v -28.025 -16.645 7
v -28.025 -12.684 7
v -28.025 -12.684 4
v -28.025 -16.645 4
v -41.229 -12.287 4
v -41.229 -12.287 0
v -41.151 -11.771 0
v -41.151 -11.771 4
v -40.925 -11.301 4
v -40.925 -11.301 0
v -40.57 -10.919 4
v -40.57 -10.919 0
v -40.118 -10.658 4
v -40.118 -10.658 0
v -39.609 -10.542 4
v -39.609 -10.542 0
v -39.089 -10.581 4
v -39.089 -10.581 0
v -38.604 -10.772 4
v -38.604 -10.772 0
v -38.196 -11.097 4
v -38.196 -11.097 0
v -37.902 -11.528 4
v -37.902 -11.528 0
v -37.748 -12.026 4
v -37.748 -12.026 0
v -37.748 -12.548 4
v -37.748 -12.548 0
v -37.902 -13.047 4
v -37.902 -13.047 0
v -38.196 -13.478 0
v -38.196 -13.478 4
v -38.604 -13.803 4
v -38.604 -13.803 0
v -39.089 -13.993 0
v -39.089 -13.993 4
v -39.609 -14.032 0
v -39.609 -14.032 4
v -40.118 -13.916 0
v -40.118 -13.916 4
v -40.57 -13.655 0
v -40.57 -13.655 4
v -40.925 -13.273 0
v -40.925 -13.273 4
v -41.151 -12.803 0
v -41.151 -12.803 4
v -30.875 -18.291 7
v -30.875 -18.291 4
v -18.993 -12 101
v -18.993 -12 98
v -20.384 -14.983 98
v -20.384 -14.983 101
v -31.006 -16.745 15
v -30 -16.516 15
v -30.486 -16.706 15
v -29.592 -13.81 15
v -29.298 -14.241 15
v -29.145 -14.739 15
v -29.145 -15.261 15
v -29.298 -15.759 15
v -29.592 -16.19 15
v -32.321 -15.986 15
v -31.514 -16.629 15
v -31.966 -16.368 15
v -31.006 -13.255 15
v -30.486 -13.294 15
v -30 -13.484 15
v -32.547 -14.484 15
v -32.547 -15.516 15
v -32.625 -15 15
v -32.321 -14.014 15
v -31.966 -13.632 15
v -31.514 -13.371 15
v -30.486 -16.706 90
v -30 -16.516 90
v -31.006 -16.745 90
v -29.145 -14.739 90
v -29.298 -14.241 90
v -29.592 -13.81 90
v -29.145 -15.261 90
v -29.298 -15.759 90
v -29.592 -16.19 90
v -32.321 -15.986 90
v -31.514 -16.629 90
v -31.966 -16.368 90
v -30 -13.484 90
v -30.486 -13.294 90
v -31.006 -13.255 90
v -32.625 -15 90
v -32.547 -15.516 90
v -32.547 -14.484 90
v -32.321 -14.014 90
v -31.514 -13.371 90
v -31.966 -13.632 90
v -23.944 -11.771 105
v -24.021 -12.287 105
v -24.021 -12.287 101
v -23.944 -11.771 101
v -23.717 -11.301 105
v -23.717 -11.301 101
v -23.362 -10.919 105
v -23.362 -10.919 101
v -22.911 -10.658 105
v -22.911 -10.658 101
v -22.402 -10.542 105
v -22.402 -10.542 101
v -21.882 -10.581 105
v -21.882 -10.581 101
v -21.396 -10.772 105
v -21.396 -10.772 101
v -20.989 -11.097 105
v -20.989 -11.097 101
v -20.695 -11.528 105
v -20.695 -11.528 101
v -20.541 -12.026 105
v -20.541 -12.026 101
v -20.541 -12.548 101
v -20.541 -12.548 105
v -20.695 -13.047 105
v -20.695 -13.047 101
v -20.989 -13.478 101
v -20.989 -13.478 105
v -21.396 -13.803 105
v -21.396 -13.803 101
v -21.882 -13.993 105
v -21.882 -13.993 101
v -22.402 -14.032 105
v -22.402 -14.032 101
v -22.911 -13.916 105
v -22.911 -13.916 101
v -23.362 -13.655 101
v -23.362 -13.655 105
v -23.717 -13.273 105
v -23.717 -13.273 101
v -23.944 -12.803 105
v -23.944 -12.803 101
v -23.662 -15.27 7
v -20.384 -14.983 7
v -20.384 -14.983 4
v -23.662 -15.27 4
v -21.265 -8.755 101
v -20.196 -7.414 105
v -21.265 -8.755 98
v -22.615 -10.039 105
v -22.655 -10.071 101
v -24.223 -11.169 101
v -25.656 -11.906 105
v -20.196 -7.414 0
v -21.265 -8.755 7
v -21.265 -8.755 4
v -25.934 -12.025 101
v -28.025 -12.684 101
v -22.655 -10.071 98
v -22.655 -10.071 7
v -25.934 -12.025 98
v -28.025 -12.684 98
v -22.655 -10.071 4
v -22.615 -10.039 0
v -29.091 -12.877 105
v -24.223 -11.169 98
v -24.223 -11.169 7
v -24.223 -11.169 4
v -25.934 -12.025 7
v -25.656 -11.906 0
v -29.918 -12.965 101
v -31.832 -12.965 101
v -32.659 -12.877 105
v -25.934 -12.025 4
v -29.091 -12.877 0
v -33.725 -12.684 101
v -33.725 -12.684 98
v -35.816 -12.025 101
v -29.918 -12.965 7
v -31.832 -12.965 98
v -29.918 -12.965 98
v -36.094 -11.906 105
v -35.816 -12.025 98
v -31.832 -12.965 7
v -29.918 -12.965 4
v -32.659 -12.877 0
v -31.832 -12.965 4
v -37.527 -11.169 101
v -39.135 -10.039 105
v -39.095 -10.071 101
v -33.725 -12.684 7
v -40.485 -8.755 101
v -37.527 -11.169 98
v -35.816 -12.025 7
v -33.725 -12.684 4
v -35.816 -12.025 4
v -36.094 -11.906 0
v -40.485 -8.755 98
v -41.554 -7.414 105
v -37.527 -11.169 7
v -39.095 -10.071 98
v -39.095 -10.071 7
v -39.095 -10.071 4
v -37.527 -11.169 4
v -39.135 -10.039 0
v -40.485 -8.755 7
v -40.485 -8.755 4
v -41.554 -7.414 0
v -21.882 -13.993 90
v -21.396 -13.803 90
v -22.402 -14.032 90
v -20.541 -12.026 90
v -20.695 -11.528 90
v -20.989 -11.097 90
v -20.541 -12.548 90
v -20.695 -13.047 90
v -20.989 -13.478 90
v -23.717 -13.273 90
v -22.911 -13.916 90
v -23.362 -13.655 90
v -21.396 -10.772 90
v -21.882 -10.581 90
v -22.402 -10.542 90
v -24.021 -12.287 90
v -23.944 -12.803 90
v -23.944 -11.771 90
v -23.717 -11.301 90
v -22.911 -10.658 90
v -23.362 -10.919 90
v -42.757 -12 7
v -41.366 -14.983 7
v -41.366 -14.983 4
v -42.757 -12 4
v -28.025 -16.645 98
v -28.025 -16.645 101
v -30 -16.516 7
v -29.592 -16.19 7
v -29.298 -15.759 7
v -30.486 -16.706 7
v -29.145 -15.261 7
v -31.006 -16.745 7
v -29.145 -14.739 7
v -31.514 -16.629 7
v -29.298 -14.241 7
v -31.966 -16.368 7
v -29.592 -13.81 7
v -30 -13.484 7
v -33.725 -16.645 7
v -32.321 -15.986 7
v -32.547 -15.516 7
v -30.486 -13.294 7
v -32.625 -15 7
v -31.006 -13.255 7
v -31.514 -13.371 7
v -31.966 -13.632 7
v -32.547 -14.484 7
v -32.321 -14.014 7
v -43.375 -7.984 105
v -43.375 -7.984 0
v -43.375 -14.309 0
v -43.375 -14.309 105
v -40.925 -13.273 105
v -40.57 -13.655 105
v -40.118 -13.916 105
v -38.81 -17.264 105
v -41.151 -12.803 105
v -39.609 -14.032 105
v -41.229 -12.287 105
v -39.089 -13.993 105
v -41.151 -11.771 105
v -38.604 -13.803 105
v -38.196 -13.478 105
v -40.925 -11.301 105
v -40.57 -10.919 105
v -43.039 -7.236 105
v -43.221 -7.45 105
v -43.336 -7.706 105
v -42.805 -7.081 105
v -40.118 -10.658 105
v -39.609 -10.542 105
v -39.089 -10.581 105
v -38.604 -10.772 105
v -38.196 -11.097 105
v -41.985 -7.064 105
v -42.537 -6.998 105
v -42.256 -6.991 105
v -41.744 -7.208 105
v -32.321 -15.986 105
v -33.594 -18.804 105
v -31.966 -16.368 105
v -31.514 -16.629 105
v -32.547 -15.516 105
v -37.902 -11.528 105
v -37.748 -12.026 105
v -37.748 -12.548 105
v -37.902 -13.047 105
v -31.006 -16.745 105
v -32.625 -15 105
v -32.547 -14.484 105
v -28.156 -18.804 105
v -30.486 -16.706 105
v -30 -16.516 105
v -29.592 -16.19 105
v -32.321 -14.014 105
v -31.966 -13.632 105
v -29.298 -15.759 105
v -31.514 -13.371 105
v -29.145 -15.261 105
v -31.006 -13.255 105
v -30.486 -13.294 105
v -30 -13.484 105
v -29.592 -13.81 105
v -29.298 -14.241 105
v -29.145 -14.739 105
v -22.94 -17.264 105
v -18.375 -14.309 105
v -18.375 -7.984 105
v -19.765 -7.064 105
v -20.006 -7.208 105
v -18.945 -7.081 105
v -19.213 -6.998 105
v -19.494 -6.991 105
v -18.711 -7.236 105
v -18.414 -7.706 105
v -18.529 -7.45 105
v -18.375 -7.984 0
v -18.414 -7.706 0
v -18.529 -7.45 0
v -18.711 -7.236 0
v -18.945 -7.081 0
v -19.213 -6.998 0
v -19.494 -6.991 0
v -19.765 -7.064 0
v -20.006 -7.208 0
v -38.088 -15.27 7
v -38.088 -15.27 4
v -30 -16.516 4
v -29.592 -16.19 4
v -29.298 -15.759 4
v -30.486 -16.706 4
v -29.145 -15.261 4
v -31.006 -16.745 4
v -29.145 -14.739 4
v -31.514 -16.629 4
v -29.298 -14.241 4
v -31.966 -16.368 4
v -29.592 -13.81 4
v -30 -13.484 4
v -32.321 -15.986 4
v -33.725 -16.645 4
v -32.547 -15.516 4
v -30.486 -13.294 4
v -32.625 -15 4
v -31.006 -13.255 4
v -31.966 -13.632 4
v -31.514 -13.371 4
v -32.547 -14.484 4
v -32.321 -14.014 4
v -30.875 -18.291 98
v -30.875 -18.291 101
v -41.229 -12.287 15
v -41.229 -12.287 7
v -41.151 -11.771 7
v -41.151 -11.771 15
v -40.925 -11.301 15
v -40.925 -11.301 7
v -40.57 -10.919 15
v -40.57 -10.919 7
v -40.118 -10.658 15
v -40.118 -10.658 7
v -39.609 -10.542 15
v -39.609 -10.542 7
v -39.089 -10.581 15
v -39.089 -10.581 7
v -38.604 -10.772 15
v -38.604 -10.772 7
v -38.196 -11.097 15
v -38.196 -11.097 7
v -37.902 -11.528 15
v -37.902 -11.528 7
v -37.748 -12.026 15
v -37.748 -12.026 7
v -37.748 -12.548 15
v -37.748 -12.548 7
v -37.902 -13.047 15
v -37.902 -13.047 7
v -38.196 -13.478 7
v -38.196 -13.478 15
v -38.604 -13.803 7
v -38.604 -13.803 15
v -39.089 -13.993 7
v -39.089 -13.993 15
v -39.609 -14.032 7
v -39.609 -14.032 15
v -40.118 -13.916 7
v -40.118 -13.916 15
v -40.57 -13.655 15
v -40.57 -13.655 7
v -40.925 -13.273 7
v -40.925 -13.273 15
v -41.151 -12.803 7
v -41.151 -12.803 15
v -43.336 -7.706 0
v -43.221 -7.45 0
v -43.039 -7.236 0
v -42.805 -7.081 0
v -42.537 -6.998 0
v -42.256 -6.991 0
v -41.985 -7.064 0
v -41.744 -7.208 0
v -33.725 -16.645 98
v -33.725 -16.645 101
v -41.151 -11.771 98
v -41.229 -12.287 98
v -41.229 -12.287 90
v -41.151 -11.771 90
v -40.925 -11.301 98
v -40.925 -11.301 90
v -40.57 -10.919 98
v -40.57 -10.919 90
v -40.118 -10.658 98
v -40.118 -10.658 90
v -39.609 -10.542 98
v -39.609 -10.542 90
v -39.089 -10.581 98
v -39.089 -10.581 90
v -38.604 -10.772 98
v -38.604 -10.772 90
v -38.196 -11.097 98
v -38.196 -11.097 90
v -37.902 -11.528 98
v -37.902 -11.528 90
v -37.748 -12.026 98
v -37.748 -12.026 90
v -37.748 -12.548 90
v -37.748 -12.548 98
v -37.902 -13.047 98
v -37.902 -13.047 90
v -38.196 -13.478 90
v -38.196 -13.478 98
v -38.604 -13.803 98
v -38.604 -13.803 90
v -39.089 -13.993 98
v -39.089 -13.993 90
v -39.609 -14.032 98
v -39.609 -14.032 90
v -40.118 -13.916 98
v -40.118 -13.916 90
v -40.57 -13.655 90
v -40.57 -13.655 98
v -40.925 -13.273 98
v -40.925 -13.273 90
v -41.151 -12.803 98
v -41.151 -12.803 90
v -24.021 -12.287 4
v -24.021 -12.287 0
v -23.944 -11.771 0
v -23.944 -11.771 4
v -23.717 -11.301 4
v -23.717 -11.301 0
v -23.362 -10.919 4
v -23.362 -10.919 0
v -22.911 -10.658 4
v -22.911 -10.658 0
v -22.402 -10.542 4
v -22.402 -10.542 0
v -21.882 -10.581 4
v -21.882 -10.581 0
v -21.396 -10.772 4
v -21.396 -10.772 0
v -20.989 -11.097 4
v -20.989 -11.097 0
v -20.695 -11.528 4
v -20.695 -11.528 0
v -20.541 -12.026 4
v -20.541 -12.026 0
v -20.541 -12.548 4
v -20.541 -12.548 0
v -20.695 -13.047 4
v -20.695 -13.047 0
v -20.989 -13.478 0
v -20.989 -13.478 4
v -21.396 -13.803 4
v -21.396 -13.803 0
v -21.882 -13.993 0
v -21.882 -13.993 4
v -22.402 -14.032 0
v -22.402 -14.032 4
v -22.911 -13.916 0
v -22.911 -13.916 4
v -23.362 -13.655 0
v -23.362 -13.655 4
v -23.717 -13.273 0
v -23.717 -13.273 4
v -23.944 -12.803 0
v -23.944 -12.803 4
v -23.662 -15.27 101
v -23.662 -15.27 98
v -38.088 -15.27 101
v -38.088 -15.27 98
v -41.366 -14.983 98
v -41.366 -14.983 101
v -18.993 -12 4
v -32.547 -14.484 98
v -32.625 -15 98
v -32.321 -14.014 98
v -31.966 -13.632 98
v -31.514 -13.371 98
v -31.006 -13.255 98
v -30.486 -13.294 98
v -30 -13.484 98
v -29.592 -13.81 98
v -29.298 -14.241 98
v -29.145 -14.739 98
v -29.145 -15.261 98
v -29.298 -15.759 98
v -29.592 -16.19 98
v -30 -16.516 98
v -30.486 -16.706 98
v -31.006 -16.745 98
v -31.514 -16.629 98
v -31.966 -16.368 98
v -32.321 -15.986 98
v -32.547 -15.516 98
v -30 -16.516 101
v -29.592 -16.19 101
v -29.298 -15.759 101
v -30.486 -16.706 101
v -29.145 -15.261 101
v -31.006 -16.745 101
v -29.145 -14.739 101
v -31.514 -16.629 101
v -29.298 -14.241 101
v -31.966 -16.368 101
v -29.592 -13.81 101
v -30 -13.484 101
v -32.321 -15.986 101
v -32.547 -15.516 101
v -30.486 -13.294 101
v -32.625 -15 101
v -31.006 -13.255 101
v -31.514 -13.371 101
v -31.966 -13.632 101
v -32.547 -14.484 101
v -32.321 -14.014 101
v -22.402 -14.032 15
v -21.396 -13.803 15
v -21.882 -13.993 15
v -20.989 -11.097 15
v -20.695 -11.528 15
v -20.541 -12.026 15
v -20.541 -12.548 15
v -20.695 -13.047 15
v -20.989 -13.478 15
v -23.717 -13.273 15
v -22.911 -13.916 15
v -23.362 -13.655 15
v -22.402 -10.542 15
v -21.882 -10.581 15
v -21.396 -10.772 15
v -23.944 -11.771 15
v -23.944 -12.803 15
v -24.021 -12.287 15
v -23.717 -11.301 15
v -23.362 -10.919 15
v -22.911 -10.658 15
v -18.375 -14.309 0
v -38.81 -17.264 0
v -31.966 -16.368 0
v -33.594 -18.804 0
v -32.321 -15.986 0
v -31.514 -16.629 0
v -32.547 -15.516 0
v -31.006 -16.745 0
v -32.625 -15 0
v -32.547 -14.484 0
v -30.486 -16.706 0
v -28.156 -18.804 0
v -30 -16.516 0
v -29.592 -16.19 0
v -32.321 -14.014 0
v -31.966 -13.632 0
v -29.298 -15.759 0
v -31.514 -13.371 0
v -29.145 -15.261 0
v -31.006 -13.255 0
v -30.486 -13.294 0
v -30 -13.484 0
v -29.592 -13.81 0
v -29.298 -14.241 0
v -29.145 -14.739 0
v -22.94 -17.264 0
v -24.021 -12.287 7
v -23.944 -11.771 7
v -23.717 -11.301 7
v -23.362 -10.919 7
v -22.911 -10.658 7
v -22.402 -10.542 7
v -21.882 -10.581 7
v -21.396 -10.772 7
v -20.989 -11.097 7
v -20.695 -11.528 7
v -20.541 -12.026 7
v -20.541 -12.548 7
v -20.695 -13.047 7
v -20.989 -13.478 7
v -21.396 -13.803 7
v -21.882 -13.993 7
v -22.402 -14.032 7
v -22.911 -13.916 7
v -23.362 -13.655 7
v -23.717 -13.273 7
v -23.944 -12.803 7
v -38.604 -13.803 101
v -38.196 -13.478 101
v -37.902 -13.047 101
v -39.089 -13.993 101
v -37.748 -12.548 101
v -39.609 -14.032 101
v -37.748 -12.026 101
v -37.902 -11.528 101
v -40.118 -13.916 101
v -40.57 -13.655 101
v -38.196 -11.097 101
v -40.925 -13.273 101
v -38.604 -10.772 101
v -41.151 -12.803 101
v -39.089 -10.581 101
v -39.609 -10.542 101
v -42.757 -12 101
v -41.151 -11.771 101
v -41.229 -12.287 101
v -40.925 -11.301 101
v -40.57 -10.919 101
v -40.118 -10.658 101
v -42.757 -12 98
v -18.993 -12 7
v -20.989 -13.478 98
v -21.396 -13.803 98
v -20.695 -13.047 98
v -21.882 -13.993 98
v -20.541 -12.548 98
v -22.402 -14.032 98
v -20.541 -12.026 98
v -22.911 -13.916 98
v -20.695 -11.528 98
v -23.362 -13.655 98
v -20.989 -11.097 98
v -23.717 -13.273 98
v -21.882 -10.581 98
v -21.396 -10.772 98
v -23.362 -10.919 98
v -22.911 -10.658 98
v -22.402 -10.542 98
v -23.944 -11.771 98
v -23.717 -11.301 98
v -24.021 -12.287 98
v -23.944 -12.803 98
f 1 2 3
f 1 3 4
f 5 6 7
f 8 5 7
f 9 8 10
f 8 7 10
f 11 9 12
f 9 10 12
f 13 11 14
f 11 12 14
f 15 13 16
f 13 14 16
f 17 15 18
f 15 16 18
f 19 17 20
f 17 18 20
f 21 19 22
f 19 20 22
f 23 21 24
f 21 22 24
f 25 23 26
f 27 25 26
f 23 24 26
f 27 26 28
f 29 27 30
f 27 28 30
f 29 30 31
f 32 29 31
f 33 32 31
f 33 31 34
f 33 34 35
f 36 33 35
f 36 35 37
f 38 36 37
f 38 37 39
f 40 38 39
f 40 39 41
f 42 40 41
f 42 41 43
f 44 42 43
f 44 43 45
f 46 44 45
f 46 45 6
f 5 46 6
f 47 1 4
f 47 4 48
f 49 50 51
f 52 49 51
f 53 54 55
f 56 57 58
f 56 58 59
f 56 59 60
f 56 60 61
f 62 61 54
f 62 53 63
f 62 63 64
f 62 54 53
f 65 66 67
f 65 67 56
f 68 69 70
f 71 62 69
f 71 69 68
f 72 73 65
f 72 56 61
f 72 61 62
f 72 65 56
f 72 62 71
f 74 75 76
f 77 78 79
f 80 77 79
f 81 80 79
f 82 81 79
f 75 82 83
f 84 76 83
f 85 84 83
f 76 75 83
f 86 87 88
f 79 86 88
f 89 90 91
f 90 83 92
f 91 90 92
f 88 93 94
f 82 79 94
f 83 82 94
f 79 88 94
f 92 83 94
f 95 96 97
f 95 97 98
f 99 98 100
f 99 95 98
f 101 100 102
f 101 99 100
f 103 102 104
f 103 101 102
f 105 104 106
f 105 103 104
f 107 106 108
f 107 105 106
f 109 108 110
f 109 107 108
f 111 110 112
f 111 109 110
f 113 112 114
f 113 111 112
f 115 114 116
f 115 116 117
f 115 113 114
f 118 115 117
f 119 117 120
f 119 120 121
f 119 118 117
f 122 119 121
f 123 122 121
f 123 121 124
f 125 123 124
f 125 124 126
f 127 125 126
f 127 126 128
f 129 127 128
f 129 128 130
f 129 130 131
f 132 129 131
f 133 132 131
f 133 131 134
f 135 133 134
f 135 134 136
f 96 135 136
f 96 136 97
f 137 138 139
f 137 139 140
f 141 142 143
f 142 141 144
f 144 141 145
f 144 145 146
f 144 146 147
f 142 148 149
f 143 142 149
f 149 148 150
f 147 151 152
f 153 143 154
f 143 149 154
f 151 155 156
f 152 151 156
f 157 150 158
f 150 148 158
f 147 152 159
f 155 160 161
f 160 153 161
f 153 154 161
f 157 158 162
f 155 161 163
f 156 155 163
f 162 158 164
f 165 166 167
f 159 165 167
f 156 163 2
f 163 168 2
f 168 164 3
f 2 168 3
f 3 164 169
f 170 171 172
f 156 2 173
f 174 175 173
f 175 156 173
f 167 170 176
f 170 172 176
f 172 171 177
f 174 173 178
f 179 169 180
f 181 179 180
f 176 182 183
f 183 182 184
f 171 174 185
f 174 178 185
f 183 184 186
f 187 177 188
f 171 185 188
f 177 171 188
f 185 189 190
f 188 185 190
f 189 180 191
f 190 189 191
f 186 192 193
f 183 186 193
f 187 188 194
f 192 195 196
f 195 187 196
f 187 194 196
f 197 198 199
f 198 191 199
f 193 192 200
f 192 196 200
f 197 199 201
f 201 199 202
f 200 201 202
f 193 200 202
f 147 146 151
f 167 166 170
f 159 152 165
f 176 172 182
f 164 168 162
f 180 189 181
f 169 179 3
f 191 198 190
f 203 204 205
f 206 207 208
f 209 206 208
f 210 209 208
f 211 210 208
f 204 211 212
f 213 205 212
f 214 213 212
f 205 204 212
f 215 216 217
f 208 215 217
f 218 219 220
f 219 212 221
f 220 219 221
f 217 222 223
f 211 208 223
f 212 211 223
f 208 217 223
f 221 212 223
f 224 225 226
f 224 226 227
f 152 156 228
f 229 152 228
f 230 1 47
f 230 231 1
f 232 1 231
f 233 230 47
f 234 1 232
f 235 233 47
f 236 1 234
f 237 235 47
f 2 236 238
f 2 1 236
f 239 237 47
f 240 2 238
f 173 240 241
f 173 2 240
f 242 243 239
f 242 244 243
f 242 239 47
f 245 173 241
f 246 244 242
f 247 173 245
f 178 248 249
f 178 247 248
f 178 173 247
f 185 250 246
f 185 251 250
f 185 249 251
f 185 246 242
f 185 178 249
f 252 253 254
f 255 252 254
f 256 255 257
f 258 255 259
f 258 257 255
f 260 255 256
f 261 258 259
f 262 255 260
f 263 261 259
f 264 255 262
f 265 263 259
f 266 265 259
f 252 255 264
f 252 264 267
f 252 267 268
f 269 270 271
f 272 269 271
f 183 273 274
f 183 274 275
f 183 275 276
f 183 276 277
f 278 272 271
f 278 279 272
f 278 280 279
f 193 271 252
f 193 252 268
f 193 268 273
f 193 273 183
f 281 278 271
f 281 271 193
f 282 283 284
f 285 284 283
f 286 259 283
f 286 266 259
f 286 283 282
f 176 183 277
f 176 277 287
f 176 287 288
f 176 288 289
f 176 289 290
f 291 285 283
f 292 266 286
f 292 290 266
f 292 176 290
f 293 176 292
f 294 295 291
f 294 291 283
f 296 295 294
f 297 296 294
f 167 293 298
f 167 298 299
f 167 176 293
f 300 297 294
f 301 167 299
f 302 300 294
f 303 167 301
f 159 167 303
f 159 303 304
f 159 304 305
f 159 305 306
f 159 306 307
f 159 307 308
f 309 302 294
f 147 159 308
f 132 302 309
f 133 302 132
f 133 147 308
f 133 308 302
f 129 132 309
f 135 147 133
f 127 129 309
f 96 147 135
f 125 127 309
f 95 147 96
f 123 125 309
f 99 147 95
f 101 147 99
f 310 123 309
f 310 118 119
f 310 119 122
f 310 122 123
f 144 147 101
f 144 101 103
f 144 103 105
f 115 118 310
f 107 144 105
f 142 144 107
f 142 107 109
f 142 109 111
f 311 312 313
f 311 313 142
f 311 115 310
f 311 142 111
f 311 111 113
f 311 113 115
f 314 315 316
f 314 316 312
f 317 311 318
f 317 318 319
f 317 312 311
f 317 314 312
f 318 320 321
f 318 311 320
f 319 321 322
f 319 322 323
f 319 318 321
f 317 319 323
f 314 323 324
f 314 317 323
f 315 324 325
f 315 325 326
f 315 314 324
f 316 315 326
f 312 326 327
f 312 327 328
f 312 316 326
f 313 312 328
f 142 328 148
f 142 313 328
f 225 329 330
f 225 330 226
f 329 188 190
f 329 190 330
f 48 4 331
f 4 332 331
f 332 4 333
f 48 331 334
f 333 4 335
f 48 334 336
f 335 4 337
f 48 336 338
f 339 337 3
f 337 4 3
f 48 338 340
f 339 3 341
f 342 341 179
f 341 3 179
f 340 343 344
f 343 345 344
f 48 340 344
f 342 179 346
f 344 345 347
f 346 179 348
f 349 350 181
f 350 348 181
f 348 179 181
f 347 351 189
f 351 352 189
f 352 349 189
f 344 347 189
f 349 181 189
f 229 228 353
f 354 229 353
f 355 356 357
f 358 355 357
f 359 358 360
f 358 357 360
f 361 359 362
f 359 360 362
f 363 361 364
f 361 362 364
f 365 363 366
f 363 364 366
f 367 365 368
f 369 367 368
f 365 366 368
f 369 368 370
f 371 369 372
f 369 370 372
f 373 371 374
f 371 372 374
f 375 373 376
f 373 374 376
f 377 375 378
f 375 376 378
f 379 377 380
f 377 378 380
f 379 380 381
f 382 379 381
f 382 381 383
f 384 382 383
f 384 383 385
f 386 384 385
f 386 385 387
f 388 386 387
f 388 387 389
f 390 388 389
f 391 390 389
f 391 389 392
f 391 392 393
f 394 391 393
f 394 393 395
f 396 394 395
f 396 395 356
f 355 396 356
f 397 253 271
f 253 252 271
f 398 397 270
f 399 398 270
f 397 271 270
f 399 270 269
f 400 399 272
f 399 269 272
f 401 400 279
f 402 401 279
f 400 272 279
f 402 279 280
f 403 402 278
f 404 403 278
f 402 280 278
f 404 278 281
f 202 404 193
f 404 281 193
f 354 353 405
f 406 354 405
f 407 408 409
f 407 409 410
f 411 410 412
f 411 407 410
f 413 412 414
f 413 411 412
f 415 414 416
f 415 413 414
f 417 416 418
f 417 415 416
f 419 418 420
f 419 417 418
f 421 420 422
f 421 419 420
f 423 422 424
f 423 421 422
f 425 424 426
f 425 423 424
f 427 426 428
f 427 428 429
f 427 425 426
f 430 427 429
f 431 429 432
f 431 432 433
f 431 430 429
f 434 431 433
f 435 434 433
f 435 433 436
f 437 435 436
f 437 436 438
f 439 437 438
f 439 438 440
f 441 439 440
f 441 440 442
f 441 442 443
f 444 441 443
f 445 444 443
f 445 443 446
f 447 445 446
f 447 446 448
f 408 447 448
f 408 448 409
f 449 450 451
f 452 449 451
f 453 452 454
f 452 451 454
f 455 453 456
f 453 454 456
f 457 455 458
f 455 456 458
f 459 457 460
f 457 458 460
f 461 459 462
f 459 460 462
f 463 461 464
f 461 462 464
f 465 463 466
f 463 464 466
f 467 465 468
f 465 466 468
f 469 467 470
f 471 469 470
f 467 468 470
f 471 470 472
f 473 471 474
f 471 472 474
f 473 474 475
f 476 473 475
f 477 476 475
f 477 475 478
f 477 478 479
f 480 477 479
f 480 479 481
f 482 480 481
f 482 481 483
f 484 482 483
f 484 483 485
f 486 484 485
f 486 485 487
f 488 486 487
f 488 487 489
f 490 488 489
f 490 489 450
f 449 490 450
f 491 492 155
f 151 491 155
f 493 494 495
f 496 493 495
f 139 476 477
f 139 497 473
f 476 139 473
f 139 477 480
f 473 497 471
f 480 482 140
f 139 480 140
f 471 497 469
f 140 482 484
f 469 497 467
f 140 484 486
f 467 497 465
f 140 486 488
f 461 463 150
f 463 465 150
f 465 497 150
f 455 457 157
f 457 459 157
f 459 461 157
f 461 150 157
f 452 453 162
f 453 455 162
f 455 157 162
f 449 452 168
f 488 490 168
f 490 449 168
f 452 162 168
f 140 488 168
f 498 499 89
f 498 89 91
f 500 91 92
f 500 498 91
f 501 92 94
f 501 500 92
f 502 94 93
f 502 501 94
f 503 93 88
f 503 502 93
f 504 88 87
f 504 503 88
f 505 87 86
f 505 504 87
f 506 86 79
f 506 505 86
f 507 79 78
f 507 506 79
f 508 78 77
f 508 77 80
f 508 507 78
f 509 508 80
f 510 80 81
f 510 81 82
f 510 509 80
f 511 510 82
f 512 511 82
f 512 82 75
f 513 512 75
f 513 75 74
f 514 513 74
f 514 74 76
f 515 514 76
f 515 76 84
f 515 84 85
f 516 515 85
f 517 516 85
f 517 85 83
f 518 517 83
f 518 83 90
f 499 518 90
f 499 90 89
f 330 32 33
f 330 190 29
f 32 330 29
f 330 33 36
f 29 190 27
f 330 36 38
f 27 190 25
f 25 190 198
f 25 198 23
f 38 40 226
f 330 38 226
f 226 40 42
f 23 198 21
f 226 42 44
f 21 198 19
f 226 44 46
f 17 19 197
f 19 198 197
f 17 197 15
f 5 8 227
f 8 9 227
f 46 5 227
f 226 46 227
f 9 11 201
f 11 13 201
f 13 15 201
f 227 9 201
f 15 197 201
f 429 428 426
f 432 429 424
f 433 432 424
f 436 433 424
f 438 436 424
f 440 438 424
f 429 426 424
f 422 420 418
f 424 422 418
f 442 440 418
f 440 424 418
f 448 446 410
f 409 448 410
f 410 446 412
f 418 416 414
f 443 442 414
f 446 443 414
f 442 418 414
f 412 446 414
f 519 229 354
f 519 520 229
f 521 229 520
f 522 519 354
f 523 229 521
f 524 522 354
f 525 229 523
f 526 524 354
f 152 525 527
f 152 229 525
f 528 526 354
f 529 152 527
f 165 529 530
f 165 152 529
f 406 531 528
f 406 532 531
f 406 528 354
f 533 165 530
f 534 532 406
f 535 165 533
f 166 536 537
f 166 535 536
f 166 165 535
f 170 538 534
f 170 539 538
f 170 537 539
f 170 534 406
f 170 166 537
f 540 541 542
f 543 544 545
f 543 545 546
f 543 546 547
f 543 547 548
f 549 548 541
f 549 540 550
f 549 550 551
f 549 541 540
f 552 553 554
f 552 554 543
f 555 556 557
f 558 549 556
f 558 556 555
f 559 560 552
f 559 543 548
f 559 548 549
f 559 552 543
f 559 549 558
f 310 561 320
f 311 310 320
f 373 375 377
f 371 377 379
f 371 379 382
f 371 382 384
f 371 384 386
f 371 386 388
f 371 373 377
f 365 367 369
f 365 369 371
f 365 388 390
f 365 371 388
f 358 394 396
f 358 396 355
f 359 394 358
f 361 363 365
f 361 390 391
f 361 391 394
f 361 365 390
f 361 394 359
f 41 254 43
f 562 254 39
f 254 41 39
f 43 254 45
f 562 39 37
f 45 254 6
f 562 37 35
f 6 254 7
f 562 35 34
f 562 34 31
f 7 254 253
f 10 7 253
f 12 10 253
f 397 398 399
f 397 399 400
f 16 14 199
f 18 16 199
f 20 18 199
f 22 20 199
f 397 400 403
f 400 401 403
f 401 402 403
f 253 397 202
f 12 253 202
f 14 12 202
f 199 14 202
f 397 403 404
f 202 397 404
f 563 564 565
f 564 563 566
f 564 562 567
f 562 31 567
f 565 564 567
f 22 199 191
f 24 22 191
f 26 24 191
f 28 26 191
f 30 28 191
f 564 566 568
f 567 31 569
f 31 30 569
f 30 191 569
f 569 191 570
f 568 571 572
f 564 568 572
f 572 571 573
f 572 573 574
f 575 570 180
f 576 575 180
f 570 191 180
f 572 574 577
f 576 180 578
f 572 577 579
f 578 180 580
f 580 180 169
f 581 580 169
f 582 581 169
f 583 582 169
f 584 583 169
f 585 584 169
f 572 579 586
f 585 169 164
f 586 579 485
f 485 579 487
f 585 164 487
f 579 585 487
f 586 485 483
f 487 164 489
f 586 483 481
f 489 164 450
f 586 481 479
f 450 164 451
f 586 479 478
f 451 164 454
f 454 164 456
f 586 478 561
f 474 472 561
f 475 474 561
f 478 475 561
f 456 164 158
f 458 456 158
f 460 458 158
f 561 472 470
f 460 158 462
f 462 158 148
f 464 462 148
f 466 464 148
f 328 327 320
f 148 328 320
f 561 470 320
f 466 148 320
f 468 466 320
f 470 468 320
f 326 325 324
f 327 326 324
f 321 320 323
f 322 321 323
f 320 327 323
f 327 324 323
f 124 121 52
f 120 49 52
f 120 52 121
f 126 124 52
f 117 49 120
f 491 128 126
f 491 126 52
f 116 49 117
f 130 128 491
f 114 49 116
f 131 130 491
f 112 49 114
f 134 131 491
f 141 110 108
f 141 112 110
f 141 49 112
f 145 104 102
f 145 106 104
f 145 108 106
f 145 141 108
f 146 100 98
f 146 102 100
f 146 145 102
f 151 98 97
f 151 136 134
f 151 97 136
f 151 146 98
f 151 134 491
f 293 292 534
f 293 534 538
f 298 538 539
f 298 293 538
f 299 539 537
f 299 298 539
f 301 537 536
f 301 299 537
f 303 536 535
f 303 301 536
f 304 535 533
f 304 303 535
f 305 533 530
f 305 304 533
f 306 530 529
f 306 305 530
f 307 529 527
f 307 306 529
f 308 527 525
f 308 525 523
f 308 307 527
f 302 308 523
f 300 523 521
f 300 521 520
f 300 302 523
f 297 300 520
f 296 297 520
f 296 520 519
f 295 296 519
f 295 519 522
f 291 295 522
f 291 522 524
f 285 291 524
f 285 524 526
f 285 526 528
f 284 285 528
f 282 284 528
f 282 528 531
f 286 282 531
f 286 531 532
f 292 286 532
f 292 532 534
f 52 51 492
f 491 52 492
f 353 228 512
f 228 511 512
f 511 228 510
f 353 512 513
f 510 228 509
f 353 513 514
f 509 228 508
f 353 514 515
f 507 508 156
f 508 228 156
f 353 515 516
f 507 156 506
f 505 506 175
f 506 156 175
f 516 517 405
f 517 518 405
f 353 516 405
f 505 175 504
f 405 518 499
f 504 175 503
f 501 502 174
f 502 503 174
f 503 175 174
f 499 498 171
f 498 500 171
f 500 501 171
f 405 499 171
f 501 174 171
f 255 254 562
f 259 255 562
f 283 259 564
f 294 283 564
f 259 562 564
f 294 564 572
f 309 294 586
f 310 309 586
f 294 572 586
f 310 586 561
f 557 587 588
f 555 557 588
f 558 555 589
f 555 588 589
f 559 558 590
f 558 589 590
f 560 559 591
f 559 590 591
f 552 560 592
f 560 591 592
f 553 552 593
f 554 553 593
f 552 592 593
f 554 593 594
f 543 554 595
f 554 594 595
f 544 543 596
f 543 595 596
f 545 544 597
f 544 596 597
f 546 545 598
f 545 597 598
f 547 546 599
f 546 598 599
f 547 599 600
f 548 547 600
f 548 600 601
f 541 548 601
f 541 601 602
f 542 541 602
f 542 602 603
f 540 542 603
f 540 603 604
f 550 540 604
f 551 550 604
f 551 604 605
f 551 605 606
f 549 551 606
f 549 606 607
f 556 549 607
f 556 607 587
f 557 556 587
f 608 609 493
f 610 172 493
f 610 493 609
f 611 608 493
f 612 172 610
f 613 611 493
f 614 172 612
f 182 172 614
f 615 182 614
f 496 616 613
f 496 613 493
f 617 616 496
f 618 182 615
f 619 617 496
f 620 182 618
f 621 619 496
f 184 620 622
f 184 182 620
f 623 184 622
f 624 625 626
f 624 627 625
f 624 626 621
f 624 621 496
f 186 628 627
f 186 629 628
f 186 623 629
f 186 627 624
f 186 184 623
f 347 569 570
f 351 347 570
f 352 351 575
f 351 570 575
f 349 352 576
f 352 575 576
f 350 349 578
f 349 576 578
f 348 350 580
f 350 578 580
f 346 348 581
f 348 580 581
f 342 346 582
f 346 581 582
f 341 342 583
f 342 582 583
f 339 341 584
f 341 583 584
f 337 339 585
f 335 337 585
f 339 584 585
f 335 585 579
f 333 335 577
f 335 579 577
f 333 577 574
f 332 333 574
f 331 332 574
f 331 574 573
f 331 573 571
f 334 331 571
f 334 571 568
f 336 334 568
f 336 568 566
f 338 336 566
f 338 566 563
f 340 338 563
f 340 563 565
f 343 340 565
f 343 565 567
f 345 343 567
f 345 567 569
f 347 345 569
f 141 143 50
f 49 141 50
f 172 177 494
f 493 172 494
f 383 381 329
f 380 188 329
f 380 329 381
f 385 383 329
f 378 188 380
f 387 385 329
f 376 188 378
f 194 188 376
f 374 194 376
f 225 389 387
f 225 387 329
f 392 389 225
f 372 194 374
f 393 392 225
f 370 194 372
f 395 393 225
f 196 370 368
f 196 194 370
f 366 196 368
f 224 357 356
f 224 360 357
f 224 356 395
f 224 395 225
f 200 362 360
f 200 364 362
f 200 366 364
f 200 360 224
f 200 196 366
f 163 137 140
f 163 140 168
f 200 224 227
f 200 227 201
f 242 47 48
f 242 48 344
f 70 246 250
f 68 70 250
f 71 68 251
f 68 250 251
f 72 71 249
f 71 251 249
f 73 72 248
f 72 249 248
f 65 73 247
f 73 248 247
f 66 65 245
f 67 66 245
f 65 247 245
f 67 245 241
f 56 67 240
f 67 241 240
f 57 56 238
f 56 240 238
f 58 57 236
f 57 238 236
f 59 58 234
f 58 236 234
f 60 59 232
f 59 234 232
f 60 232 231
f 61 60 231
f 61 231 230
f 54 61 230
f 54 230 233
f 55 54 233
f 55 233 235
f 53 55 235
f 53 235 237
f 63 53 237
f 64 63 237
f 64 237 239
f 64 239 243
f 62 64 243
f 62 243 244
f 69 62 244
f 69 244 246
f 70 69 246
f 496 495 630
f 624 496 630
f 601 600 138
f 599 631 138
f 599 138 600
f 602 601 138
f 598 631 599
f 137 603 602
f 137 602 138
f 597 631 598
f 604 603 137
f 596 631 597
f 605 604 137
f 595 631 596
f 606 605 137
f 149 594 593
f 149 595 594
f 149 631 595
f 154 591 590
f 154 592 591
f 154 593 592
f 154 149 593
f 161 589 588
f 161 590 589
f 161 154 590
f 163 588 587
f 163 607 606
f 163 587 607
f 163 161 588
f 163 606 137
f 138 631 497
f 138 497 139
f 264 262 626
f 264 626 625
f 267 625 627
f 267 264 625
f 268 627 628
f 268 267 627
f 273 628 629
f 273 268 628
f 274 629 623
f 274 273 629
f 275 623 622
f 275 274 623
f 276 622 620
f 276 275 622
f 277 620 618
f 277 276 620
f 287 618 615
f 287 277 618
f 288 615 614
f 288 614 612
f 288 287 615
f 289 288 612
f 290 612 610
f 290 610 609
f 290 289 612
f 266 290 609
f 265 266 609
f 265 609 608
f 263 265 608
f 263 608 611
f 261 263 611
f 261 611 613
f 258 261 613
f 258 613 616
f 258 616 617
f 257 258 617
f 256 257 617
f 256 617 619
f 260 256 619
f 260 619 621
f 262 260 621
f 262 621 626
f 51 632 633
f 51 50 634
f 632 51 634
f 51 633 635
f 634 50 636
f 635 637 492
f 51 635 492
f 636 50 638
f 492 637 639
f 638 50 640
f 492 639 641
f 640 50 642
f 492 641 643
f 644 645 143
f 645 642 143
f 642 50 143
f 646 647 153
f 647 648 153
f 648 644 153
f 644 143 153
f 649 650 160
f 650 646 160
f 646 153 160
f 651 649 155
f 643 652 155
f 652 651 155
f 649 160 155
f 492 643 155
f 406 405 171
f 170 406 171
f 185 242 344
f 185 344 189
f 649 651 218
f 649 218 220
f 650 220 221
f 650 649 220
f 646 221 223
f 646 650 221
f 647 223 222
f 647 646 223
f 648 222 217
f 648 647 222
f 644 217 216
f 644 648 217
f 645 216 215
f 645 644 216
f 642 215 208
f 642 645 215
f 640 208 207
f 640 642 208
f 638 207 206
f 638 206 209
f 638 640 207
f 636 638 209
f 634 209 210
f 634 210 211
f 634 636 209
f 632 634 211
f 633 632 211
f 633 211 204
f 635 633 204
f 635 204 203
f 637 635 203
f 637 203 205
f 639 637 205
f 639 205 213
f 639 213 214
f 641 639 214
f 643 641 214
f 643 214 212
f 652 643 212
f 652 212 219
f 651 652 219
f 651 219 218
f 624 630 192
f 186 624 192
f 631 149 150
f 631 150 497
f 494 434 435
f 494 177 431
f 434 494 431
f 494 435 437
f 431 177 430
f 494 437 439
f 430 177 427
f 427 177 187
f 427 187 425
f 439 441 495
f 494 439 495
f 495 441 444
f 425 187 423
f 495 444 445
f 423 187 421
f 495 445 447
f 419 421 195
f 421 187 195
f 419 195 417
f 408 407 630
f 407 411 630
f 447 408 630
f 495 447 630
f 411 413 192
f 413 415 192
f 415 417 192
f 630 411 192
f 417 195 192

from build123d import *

# Parameters (mm, degrees)
BOSS_EXTRUDE1_DEPTH    = 105
SKETCH3_R              = 1.75
CUT_EXTRUDE1_DEPTH     = 15
CUT_EXTRUDE2_START     = -3
CUT_EXTRUDE2_OUTLINE_R = 1.75
CUT_EXTRUDE2_DEPTH     = 3
FILLET1_R              = 1


# Read off the part's stored shape, not the designer's step: Cut-Extrude2
with BuildPart() as part:
    # Sketch1 → Boss-Extrude1 (new body)
    with BuildSketch(Plane.XY):
        with BuildLine():
            ThreePointArc((-43.375, -14.309088021), (-30.875, -19), (-18.375, -14.309088021))
            Line((-18.375, -14.309088021), (-18.375, -3.570714214))
            ThreePointArc((-18.375, -3.570714214), (-30.875, -13), (-43.375, -3.570714214))
            Line((-43.375, -3.570714214), (-43.375, -14.309088021))
        make_face()
    extrude(amount=BOSS_EXTRUDE1_DEPTH)

    # Sketch3 → Cut-Extrude1 (cut)
    with BuildSketch(Plane(origin=(0, 0, 0), x_dir=(-1, 0, 0), z_dir=(0, 0, -1))):
        with Locations((22.271353455, -12.287280664)):
            Circle(SKETCH3_R)
        with Locations((30.875, -15)):
            Circle(SKETCH3_R)
        with Locations((39.478646545, -12.287280664)):
            Circle(SKETCH3_R)
    cut_extrude1 = extrude(amount=-CUT_EXTRUDE1_DEPTH, mode=Mode.SUBTRACT)

    # Cut-Extrude2 outline → Cut-Extrude2 (cut)
    # profile 1 of 3: a face of its own
    with BuildSketch(Plane(origin=(0, 0, 4), x_dir=(-1, 0, 0), z_dir=(0, 0, -1)).offset(CUT_EXTRUDE2_START)):
        with BuildLine():
            Line((20.383772748, -14.983025288), (23.662146428, -15.26984582))
            Line((23.662146428, -15.26984582), (25.93448352, -12.024612131))
            ThreePointArc((25.93448352, -12.024612131), (23.418506327, -10.648976576), (21.265316867, -8.755226444))
            Line((21.265316867, -8.755226444), (18.992979775, -12.000460133))
            Line((18.992979775, -12.000460133), (20.383772748, -14.983025288))
        make_face()
        with Locations((22.271353455, -12.287280664)):
            Circle(CUT_EXTRUDE2_OUTLINE_R, mode=Mode.SUBTRACT)
    # profile 2 of 3: a face of its own
    with BuildSketch(Plane(origin=(0, 0, 4), x_dir=(-1, 0, 0), z_dir=(0, 0, -1)).offset(CUT_EXTRUDE2_START)):
        with BuildLine():
            ThreePointArc((40.484683133, -8.755226444), (38.331493673, -10.648976576), (35.81551648, -12.024612131))
            Line((35.81551648, -12.024612131), (38.087853572, -15.26984582))
            Line((38.087853572, -15.26984582), (41.366227252, -14.983025288))
            Line((41.366227252, -14.983025288), (42.757020225, -12.000460133))
            Line((42.757020225, -12.000460133), (40.484683133, -8.755226444))
        make_face()
        with Locations((39.478646545, -12.287280664)):
            Circle(CUT_EXTRUDE2_OUTLINE_R, mode=Mode.SUBTRACT)
    # profile 3 of 3: a face of its own
    with BuildSketch(Plane(origin=(0, 0, 4), x_dir=(-1, 0, 0), z_dir=(0, 0, -1)).offset(CUT_EXTRUDE2_START)):
        with BuildLine():
            ThreePointArc((33.725, -12.683749446), (30.875, -13), (28.025, -12.683749446))
            Line((28.025, -12.683749446), (28.025, -16.645448267))
            Line((28.025, -16.645448267), (30.875, -18.290896534))
            Line((30.875, -18.290896534), (33.725, -16.645448267))
            Line((33.725, -16.645448267), (33.725, -12.683749446))
        make_face()
        with Locations((30.875, -15)):
            Circle(CUT_EXTRUDE2_OUTLINE_R, mode=Mode.SUBTRACT)
    cut_extrude2 = extrude(amount=CUT_EXTRUDE2_DEPTH, mode=Mode.SUBTRACT)

    # Mirror1: Cut-Extrude1, Cut-Extrude2 across plane
    add(cut_extrude1.mirror(Plane(origin=(0, 0, 52.5), x_dir=(1, 0, 0), z_dir=(0, 0, -1))), mode=Mode.SUBTRACT)
    add(cut_extrude2.mirror(Plane(origin=(0, 0, 52.5), x_dir=(1, 0, 0), z_dir=(0, 0, -1))), mode=Mode.SUBTRACT)

    # Fillet1
    fillet1_edges = [part.edges().sort_by_distance(p)[0] for p in [
        (-18.375, -3.570714214, 52.5),
        (-43.375, -3.570714214, 52.5),
    ]]
    fillet(fillet1_edges, radius=FILLET1_R)


solid = part.part
